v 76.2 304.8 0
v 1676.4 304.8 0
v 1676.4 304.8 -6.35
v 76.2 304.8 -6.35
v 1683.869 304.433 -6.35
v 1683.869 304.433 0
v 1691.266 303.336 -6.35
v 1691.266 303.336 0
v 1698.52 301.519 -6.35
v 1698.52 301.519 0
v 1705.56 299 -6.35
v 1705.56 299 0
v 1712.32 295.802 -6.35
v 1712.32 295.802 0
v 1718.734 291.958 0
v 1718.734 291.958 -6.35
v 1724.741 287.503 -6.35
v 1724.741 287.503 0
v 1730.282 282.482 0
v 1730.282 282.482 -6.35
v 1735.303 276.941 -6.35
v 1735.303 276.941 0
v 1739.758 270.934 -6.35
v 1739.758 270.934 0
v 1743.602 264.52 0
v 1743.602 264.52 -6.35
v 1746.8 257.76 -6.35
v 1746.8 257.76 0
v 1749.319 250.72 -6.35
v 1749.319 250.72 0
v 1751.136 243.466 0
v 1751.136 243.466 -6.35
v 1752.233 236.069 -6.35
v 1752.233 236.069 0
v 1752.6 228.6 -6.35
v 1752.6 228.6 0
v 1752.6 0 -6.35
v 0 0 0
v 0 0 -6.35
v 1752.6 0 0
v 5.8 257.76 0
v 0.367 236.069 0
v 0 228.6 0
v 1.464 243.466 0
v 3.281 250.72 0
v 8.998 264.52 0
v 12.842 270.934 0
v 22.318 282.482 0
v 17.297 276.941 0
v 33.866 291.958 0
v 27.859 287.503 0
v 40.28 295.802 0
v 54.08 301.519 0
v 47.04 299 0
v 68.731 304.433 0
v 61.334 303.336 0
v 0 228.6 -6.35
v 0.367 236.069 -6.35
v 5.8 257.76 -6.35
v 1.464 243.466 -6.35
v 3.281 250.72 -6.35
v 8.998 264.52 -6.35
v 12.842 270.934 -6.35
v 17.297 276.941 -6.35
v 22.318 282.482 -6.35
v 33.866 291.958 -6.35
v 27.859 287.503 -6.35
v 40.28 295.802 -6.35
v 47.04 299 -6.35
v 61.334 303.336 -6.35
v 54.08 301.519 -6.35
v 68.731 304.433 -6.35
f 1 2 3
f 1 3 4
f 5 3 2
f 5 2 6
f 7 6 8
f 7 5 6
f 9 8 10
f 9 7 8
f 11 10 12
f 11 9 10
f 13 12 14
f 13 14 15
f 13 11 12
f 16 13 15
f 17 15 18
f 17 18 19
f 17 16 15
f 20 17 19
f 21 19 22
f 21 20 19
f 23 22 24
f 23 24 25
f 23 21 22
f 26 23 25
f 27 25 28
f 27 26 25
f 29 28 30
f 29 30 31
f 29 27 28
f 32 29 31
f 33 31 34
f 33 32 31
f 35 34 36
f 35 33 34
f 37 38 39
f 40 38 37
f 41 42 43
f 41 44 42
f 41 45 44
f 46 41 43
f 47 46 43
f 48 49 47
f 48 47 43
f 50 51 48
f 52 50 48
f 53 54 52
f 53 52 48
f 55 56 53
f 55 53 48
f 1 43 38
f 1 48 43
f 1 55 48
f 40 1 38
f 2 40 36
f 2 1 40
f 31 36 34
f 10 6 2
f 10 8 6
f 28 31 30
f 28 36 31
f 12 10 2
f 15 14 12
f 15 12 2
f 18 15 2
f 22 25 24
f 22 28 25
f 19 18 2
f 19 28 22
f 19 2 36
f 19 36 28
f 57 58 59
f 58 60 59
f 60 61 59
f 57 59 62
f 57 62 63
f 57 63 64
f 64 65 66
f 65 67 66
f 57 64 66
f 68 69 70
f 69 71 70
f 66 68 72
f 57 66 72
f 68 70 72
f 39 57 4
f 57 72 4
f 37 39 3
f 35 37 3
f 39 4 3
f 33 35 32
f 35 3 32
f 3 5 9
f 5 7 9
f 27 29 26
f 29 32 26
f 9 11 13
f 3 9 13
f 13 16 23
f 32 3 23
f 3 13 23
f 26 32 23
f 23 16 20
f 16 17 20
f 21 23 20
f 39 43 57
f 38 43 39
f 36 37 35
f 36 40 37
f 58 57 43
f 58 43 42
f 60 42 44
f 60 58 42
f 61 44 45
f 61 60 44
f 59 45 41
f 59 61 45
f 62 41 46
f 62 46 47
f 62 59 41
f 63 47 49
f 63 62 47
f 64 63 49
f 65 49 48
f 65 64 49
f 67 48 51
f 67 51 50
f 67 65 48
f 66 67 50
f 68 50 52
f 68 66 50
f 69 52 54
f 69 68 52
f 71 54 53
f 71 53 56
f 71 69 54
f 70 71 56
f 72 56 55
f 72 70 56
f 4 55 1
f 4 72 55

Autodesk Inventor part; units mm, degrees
ref_plane "YZ Plane" through (0, 0, 0) normal (1, 0, 0) x (0, 1, 0)
ref_plane "XZ Plane" through (0, 0, 0) normal (0, 1, 0) x (-1, 0, 0)
ref_plane "XY Plane" through (0, 0, 0) normal (0, 0, 1) x (1, 0, 0)
sketch "Sketch1" plane through (0, 0, 0) normal (0, 0, 1) x (1, 0, 0)
  line L0 (0, 0) -> (1752.6, 0)
  line L1 (1752.6, 0) -> (1752.6, 304.8)
  line L2 (1752.6, 304.8) -> (0, 304.8)
  line L3 (0, 304.8) -> (0, 0)
  dimension "d0" = 1752.6
  dimension "d1" = 304.8
extrude "Extrusion1" add sketch "Sketch1" against normal blind 6.35
fillet "Fillet1" radius 76.2 2 edges at (0, 304.8, -3.175) (1752.6, 304.8, -3.175)
ref_plane "Work Plane1" through (876.3, 0, 0) normal (1, 0, 0) x (0, 1, 0)
properties part number "FE00036Shelf" material "Aluminum 6061"
